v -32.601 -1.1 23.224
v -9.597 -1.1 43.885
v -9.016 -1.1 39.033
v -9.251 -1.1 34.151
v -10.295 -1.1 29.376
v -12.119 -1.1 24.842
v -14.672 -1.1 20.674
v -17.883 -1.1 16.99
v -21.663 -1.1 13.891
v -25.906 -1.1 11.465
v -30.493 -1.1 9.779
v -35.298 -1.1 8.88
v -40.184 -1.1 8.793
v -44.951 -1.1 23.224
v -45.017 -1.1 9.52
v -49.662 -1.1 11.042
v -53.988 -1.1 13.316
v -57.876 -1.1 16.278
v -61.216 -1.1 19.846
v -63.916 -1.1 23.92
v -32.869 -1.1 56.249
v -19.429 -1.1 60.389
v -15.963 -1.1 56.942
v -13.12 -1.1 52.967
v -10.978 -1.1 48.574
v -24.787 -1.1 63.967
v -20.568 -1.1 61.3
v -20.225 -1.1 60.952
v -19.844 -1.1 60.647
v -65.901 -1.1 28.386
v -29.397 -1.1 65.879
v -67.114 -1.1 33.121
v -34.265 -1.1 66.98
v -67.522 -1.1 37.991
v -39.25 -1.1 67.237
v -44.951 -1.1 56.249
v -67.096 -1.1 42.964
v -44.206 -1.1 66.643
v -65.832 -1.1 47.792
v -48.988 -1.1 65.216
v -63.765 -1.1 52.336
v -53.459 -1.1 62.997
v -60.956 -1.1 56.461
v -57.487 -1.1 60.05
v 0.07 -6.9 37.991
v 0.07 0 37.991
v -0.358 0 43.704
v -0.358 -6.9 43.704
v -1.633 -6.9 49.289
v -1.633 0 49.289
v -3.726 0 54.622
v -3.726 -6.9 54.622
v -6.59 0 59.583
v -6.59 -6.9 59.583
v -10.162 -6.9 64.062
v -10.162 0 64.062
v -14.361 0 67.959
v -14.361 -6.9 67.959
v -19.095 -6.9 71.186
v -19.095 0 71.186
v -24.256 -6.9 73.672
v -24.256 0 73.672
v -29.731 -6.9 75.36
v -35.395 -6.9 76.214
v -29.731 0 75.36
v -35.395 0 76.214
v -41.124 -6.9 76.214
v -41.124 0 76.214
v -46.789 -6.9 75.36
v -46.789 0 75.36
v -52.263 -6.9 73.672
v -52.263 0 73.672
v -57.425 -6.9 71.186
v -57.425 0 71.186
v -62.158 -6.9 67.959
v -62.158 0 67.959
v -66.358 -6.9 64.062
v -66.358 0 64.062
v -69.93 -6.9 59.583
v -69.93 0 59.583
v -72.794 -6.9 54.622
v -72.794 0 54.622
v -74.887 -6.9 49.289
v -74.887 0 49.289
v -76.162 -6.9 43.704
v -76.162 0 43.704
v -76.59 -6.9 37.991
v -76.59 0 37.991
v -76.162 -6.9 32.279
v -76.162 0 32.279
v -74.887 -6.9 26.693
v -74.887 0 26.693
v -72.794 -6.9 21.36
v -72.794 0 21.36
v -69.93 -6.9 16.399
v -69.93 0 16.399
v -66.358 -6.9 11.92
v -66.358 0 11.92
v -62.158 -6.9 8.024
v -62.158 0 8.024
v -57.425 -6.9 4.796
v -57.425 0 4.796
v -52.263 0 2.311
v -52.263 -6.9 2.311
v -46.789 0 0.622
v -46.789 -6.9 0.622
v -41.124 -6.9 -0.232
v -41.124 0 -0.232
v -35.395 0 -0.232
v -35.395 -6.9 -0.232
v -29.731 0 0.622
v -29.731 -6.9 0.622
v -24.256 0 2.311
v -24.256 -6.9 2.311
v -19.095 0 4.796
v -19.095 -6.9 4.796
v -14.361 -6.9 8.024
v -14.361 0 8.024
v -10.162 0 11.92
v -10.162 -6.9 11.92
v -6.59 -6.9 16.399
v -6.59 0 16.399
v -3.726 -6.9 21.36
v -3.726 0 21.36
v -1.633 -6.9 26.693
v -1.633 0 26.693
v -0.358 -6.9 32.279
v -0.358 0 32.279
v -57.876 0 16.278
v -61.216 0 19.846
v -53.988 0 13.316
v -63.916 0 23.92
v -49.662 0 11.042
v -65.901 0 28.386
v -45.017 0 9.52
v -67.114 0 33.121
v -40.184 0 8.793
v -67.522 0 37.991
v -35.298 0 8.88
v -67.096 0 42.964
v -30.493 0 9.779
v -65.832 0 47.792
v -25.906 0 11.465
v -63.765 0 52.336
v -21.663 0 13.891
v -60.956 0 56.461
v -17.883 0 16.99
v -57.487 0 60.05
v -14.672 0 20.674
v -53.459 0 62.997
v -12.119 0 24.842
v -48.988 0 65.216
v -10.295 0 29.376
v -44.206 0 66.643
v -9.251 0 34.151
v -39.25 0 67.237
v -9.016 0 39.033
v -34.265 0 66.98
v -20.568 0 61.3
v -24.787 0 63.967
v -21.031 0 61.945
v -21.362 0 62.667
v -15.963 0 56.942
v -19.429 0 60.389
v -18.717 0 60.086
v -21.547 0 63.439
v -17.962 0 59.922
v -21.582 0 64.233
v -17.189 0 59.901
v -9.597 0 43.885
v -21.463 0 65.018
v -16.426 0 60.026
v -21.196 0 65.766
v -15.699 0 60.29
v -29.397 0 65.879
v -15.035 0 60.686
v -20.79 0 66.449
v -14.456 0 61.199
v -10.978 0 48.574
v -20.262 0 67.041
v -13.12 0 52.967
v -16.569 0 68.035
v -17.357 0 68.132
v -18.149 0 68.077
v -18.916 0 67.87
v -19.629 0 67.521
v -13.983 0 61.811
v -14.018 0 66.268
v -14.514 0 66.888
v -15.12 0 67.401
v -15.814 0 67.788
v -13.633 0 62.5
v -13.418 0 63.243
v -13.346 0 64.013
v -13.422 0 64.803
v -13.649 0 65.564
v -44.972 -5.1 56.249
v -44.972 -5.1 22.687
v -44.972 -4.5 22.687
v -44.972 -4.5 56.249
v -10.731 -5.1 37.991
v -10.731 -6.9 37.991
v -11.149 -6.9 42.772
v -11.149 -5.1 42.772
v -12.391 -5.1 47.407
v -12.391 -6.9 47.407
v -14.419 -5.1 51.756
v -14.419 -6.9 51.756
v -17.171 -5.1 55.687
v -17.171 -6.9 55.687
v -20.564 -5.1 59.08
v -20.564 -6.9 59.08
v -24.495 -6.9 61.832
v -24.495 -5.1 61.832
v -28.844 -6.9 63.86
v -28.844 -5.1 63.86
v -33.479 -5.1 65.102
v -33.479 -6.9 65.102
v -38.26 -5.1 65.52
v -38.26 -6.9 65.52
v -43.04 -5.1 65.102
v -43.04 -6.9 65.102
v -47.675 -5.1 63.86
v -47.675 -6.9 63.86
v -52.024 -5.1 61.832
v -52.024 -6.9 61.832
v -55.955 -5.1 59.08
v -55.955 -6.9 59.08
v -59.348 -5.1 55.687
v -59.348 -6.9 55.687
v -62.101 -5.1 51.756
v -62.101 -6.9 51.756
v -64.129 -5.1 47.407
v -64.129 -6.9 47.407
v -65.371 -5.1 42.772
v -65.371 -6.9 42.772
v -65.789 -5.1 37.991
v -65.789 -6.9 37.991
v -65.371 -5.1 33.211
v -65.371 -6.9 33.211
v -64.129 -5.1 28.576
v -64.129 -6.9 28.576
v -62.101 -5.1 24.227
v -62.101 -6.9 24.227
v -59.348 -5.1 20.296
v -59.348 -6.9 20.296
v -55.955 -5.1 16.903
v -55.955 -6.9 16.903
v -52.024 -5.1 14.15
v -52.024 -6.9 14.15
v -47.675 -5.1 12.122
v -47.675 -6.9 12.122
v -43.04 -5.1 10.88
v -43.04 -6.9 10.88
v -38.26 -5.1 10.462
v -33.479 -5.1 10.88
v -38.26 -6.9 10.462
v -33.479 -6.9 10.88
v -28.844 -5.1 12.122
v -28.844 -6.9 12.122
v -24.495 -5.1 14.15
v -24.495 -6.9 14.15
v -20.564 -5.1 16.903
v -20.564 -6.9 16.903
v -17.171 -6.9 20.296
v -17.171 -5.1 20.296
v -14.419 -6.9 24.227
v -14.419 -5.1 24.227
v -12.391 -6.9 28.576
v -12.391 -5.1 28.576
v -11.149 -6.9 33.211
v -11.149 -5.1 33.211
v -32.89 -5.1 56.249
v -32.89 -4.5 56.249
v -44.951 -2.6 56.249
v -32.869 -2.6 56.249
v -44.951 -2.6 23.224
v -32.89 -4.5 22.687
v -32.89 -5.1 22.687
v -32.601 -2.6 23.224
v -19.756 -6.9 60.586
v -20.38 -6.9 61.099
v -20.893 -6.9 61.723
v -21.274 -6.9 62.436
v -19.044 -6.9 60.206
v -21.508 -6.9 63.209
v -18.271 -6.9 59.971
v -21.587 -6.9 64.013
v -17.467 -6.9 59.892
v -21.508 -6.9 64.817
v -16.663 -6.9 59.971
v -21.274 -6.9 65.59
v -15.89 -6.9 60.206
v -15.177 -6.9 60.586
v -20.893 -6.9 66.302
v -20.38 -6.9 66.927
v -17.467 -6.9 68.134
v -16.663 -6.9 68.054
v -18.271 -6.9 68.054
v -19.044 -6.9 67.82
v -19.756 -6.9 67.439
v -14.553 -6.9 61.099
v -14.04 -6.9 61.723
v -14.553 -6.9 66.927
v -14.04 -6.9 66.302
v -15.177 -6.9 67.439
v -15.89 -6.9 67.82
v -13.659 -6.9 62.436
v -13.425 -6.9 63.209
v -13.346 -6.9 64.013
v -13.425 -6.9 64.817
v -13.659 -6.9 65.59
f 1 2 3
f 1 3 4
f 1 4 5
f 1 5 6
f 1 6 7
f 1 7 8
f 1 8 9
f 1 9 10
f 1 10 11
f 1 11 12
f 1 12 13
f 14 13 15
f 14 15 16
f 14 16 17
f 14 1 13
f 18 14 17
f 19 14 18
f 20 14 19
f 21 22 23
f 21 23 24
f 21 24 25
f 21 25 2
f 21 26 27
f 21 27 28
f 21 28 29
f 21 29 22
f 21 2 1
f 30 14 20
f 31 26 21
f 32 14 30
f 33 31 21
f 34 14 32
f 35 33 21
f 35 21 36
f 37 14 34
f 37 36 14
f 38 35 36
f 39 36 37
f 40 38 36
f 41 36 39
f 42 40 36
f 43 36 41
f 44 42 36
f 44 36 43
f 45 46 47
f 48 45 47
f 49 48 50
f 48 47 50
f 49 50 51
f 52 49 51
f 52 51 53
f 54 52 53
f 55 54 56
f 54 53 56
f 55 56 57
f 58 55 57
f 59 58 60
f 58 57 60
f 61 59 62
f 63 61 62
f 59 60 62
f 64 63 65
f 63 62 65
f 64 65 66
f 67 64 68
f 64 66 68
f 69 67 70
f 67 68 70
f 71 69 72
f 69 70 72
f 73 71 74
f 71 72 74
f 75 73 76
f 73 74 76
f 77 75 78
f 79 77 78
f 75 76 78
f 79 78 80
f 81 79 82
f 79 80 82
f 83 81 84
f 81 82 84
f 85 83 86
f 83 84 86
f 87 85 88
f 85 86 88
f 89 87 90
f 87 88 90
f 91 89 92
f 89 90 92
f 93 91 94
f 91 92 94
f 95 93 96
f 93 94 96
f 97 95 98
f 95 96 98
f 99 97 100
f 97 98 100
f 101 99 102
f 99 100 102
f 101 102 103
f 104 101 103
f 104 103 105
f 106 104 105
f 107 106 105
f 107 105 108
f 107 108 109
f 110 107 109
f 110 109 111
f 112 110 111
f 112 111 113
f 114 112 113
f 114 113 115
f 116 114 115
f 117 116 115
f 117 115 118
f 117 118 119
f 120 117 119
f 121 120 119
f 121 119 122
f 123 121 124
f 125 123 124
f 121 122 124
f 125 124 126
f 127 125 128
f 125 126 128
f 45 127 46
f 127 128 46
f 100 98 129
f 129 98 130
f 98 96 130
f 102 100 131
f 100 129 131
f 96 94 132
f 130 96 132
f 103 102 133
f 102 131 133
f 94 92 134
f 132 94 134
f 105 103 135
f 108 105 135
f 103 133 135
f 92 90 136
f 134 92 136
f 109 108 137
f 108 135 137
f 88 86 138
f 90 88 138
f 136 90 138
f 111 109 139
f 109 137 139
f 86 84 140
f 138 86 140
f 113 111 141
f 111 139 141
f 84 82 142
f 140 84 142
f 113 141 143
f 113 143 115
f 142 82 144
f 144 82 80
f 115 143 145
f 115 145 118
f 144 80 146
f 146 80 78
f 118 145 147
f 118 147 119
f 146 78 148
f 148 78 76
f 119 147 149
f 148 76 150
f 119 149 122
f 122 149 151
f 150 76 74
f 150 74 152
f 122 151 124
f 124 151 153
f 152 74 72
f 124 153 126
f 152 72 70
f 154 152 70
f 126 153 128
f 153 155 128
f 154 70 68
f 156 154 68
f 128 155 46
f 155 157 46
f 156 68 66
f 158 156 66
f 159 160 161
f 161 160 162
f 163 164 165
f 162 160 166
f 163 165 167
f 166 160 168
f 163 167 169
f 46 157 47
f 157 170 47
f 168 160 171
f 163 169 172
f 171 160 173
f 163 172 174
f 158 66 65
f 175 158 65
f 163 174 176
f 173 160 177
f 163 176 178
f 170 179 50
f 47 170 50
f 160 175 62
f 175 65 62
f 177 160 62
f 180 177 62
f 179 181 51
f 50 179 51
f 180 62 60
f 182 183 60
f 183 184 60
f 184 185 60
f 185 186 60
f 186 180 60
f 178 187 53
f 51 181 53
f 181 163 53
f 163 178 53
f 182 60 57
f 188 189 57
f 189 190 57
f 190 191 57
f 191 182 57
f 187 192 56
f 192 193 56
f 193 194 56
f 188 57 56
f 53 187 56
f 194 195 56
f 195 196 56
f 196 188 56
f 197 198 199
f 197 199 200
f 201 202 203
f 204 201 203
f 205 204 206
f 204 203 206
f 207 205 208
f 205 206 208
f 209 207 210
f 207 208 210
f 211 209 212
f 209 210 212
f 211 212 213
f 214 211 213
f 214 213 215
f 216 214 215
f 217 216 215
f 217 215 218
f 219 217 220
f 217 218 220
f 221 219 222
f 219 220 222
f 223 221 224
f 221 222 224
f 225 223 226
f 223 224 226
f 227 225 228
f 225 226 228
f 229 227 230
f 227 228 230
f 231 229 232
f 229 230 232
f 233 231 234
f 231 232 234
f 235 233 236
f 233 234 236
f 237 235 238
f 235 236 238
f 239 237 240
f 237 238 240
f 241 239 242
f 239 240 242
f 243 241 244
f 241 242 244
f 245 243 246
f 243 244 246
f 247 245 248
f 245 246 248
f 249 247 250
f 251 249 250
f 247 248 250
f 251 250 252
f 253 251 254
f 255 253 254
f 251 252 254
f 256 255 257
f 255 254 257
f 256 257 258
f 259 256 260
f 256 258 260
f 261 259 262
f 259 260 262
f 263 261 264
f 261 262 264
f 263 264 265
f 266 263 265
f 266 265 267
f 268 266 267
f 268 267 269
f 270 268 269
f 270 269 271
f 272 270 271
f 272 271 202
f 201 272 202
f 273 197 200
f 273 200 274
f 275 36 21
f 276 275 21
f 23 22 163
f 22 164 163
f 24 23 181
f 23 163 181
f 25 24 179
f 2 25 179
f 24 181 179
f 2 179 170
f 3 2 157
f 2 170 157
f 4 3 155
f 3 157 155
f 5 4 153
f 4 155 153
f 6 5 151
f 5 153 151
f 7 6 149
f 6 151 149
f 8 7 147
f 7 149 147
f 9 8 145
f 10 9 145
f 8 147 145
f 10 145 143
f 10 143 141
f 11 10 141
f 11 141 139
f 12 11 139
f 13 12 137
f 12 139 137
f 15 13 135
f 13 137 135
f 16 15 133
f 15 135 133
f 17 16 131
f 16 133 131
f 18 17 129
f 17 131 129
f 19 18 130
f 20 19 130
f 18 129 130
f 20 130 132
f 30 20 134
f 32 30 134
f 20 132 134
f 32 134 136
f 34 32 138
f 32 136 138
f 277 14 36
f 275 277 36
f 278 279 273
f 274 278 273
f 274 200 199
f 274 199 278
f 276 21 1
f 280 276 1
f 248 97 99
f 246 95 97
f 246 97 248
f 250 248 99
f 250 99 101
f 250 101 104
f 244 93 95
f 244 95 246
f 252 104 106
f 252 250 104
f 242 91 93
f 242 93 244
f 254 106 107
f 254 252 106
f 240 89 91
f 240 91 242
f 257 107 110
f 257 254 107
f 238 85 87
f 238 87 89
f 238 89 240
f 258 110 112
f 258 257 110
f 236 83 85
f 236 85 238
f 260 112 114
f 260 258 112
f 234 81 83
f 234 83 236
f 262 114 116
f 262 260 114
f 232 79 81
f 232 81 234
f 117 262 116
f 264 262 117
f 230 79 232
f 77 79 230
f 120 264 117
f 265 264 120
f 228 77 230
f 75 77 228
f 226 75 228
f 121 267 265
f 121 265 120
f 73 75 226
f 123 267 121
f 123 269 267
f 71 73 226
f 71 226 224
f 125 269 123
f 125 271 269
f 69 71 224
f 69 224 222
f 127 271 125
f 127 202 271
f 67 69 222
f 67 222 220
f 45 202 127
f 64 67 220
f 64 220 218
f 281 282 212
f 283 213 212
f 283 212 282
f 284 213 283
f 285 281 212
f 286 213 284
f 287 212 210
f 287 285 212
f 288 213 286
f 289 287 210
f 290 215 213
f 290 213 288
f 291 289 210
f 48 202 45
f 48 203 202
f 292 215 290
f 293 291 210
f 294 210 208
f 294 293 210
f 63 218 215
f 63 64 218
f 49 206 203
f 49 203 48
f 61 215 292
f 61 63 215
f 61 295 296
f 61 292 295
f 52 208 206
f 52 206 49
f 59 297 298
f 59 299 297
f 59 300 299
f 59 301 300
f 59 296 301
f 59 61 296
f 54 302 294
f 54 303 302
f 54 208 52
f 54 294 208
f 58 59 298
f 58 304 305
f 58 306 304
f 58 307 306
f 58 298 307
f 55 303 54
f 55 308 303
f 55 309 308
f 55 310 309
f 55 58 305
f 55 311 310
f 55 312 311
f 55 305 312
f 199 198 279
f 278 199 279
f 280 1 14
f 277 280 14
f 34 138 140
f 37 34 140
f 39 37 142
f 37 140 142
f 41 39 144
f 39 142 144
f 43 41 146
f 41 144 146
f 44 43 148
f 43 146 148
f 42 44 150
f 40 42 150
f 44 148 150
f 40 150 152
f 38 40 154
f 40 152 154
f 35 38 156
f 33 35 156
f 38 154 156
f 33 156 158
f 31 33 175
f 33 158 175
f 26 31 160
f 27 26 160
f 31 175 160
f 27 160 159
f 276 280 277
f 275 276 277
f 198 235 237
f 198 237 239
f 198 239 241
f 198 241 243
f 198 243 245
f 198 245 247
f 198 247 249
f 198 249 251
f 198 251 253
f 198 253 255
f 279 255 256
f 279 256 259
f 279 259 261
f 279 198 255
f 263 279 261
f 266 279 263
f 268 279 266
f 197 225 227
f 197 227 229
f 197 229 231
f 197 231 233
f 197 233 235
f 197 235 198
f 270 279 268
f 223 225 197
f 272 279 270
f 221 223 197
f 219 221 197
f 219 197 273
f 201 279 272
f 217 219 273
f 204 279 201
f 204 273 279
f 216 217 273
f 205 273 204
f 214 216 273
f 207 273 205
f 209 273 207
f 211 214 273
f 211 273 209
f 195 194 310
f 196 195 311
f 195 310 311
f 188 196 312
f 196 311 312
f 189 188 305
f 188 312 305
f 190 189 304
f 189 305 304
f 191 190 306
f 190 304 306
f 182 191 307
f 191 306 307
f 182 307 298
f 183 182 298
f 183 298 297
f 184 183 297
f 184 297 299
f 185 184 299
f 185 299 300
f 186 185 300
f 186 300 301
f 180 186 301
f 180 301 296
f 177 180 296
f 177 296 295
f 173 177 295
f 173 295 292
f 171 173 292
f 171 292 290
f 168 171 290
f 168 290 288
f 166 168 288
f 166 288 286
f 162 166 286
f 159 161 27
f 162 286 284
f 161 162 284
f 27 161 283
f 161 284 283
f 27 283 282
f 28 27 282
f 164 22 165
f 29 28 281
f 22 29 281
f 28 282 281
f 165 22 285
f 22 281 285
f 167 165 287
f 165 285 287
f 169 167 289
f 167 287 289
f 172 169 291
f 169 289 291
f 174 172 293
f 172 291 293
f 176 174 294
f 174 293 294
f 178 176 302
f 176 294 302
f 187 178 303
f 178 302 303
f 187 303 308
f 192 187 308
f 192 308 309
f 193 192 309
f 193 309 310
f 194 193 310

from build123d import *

# Parameters (mm, degrees)
F0_R      = 38.330172
F1_DEPTH  = 6.9
F2_R      = 27.529056
F3_DEPTH  = 1.8
F4_R      = 29.262122
F5_DEPTH  = 1.1
F8_DEPTH  = 1.5
F6_W      = 12.082048
F6_H      = 33.561243
F9_DEPTH  = 0.6
F10_R     = 4.120832
F11_DEPTH = 25


with BuildPart() as f1:
    # F0 (on Front) → F1 (new body)
    with BuildSketch(Plane.XZ):
        with Locations((-38.259815, 37.991326)):
            Circle(F0_R)
    extrude(amount=F1_DEPTH)

    # F2 (on face) → F3 (cut)
    with BuildSketch(Plane.XZ.offset(6.9)):
        with Locations((-38.259815, 37.991326)):
            Circle(F2_R)
    extrude(amount=-F3_DEPTH, mode=Mode.SUBTRACT)

    # F4 (on face) → F5 (cut)
    with BuildSketch(Plane(origin=(0, 0, 0), x_dir=(-1, 0, 0), z_dir=(0, 1, 0))):
        with Locations((38.259815, 37.991326)):
            Circle(F4_R)
    extrude(amount=-F5_DEPTH, mode=Mode.SUBTRACT)

    # F7 (on face) → F8 (cut)
    with BuildSketch(Plane(origin=(0, -1.1, 0), x_dir=(-1, 0, 0), z_dir=(0, 1, 0))):
        Polygon((44.951111, 56.248643), (32.869063, 56.248643), (32.600574, 23.22438), (44.951111, 23.22438), align=None)
    extrude(amount=-F8_DEPTH, mode=Mode.SUBTRACT)

    # F6 (on face) → F9 (cut)
    with BuildSketch(Plane.XZ.offset(5.1)):
        with Locations((-38.931042, 39.468021)):
            Rectangle(F6_W, F6_H)
    extrude(amount=-F9_DEPTH, mode=Mode.SUBTRACT)

    # F10 (on face) → F11 (cut)
    with BuildSketch(Plane.XZ.offset(6.9)):
        with Locations((-17.46659, 64.012818)):
            Circle(F10_R)
    extrude(amount=-F11_DEPTH, mode=Mode.SUBTRACT)


solid = f1.part
